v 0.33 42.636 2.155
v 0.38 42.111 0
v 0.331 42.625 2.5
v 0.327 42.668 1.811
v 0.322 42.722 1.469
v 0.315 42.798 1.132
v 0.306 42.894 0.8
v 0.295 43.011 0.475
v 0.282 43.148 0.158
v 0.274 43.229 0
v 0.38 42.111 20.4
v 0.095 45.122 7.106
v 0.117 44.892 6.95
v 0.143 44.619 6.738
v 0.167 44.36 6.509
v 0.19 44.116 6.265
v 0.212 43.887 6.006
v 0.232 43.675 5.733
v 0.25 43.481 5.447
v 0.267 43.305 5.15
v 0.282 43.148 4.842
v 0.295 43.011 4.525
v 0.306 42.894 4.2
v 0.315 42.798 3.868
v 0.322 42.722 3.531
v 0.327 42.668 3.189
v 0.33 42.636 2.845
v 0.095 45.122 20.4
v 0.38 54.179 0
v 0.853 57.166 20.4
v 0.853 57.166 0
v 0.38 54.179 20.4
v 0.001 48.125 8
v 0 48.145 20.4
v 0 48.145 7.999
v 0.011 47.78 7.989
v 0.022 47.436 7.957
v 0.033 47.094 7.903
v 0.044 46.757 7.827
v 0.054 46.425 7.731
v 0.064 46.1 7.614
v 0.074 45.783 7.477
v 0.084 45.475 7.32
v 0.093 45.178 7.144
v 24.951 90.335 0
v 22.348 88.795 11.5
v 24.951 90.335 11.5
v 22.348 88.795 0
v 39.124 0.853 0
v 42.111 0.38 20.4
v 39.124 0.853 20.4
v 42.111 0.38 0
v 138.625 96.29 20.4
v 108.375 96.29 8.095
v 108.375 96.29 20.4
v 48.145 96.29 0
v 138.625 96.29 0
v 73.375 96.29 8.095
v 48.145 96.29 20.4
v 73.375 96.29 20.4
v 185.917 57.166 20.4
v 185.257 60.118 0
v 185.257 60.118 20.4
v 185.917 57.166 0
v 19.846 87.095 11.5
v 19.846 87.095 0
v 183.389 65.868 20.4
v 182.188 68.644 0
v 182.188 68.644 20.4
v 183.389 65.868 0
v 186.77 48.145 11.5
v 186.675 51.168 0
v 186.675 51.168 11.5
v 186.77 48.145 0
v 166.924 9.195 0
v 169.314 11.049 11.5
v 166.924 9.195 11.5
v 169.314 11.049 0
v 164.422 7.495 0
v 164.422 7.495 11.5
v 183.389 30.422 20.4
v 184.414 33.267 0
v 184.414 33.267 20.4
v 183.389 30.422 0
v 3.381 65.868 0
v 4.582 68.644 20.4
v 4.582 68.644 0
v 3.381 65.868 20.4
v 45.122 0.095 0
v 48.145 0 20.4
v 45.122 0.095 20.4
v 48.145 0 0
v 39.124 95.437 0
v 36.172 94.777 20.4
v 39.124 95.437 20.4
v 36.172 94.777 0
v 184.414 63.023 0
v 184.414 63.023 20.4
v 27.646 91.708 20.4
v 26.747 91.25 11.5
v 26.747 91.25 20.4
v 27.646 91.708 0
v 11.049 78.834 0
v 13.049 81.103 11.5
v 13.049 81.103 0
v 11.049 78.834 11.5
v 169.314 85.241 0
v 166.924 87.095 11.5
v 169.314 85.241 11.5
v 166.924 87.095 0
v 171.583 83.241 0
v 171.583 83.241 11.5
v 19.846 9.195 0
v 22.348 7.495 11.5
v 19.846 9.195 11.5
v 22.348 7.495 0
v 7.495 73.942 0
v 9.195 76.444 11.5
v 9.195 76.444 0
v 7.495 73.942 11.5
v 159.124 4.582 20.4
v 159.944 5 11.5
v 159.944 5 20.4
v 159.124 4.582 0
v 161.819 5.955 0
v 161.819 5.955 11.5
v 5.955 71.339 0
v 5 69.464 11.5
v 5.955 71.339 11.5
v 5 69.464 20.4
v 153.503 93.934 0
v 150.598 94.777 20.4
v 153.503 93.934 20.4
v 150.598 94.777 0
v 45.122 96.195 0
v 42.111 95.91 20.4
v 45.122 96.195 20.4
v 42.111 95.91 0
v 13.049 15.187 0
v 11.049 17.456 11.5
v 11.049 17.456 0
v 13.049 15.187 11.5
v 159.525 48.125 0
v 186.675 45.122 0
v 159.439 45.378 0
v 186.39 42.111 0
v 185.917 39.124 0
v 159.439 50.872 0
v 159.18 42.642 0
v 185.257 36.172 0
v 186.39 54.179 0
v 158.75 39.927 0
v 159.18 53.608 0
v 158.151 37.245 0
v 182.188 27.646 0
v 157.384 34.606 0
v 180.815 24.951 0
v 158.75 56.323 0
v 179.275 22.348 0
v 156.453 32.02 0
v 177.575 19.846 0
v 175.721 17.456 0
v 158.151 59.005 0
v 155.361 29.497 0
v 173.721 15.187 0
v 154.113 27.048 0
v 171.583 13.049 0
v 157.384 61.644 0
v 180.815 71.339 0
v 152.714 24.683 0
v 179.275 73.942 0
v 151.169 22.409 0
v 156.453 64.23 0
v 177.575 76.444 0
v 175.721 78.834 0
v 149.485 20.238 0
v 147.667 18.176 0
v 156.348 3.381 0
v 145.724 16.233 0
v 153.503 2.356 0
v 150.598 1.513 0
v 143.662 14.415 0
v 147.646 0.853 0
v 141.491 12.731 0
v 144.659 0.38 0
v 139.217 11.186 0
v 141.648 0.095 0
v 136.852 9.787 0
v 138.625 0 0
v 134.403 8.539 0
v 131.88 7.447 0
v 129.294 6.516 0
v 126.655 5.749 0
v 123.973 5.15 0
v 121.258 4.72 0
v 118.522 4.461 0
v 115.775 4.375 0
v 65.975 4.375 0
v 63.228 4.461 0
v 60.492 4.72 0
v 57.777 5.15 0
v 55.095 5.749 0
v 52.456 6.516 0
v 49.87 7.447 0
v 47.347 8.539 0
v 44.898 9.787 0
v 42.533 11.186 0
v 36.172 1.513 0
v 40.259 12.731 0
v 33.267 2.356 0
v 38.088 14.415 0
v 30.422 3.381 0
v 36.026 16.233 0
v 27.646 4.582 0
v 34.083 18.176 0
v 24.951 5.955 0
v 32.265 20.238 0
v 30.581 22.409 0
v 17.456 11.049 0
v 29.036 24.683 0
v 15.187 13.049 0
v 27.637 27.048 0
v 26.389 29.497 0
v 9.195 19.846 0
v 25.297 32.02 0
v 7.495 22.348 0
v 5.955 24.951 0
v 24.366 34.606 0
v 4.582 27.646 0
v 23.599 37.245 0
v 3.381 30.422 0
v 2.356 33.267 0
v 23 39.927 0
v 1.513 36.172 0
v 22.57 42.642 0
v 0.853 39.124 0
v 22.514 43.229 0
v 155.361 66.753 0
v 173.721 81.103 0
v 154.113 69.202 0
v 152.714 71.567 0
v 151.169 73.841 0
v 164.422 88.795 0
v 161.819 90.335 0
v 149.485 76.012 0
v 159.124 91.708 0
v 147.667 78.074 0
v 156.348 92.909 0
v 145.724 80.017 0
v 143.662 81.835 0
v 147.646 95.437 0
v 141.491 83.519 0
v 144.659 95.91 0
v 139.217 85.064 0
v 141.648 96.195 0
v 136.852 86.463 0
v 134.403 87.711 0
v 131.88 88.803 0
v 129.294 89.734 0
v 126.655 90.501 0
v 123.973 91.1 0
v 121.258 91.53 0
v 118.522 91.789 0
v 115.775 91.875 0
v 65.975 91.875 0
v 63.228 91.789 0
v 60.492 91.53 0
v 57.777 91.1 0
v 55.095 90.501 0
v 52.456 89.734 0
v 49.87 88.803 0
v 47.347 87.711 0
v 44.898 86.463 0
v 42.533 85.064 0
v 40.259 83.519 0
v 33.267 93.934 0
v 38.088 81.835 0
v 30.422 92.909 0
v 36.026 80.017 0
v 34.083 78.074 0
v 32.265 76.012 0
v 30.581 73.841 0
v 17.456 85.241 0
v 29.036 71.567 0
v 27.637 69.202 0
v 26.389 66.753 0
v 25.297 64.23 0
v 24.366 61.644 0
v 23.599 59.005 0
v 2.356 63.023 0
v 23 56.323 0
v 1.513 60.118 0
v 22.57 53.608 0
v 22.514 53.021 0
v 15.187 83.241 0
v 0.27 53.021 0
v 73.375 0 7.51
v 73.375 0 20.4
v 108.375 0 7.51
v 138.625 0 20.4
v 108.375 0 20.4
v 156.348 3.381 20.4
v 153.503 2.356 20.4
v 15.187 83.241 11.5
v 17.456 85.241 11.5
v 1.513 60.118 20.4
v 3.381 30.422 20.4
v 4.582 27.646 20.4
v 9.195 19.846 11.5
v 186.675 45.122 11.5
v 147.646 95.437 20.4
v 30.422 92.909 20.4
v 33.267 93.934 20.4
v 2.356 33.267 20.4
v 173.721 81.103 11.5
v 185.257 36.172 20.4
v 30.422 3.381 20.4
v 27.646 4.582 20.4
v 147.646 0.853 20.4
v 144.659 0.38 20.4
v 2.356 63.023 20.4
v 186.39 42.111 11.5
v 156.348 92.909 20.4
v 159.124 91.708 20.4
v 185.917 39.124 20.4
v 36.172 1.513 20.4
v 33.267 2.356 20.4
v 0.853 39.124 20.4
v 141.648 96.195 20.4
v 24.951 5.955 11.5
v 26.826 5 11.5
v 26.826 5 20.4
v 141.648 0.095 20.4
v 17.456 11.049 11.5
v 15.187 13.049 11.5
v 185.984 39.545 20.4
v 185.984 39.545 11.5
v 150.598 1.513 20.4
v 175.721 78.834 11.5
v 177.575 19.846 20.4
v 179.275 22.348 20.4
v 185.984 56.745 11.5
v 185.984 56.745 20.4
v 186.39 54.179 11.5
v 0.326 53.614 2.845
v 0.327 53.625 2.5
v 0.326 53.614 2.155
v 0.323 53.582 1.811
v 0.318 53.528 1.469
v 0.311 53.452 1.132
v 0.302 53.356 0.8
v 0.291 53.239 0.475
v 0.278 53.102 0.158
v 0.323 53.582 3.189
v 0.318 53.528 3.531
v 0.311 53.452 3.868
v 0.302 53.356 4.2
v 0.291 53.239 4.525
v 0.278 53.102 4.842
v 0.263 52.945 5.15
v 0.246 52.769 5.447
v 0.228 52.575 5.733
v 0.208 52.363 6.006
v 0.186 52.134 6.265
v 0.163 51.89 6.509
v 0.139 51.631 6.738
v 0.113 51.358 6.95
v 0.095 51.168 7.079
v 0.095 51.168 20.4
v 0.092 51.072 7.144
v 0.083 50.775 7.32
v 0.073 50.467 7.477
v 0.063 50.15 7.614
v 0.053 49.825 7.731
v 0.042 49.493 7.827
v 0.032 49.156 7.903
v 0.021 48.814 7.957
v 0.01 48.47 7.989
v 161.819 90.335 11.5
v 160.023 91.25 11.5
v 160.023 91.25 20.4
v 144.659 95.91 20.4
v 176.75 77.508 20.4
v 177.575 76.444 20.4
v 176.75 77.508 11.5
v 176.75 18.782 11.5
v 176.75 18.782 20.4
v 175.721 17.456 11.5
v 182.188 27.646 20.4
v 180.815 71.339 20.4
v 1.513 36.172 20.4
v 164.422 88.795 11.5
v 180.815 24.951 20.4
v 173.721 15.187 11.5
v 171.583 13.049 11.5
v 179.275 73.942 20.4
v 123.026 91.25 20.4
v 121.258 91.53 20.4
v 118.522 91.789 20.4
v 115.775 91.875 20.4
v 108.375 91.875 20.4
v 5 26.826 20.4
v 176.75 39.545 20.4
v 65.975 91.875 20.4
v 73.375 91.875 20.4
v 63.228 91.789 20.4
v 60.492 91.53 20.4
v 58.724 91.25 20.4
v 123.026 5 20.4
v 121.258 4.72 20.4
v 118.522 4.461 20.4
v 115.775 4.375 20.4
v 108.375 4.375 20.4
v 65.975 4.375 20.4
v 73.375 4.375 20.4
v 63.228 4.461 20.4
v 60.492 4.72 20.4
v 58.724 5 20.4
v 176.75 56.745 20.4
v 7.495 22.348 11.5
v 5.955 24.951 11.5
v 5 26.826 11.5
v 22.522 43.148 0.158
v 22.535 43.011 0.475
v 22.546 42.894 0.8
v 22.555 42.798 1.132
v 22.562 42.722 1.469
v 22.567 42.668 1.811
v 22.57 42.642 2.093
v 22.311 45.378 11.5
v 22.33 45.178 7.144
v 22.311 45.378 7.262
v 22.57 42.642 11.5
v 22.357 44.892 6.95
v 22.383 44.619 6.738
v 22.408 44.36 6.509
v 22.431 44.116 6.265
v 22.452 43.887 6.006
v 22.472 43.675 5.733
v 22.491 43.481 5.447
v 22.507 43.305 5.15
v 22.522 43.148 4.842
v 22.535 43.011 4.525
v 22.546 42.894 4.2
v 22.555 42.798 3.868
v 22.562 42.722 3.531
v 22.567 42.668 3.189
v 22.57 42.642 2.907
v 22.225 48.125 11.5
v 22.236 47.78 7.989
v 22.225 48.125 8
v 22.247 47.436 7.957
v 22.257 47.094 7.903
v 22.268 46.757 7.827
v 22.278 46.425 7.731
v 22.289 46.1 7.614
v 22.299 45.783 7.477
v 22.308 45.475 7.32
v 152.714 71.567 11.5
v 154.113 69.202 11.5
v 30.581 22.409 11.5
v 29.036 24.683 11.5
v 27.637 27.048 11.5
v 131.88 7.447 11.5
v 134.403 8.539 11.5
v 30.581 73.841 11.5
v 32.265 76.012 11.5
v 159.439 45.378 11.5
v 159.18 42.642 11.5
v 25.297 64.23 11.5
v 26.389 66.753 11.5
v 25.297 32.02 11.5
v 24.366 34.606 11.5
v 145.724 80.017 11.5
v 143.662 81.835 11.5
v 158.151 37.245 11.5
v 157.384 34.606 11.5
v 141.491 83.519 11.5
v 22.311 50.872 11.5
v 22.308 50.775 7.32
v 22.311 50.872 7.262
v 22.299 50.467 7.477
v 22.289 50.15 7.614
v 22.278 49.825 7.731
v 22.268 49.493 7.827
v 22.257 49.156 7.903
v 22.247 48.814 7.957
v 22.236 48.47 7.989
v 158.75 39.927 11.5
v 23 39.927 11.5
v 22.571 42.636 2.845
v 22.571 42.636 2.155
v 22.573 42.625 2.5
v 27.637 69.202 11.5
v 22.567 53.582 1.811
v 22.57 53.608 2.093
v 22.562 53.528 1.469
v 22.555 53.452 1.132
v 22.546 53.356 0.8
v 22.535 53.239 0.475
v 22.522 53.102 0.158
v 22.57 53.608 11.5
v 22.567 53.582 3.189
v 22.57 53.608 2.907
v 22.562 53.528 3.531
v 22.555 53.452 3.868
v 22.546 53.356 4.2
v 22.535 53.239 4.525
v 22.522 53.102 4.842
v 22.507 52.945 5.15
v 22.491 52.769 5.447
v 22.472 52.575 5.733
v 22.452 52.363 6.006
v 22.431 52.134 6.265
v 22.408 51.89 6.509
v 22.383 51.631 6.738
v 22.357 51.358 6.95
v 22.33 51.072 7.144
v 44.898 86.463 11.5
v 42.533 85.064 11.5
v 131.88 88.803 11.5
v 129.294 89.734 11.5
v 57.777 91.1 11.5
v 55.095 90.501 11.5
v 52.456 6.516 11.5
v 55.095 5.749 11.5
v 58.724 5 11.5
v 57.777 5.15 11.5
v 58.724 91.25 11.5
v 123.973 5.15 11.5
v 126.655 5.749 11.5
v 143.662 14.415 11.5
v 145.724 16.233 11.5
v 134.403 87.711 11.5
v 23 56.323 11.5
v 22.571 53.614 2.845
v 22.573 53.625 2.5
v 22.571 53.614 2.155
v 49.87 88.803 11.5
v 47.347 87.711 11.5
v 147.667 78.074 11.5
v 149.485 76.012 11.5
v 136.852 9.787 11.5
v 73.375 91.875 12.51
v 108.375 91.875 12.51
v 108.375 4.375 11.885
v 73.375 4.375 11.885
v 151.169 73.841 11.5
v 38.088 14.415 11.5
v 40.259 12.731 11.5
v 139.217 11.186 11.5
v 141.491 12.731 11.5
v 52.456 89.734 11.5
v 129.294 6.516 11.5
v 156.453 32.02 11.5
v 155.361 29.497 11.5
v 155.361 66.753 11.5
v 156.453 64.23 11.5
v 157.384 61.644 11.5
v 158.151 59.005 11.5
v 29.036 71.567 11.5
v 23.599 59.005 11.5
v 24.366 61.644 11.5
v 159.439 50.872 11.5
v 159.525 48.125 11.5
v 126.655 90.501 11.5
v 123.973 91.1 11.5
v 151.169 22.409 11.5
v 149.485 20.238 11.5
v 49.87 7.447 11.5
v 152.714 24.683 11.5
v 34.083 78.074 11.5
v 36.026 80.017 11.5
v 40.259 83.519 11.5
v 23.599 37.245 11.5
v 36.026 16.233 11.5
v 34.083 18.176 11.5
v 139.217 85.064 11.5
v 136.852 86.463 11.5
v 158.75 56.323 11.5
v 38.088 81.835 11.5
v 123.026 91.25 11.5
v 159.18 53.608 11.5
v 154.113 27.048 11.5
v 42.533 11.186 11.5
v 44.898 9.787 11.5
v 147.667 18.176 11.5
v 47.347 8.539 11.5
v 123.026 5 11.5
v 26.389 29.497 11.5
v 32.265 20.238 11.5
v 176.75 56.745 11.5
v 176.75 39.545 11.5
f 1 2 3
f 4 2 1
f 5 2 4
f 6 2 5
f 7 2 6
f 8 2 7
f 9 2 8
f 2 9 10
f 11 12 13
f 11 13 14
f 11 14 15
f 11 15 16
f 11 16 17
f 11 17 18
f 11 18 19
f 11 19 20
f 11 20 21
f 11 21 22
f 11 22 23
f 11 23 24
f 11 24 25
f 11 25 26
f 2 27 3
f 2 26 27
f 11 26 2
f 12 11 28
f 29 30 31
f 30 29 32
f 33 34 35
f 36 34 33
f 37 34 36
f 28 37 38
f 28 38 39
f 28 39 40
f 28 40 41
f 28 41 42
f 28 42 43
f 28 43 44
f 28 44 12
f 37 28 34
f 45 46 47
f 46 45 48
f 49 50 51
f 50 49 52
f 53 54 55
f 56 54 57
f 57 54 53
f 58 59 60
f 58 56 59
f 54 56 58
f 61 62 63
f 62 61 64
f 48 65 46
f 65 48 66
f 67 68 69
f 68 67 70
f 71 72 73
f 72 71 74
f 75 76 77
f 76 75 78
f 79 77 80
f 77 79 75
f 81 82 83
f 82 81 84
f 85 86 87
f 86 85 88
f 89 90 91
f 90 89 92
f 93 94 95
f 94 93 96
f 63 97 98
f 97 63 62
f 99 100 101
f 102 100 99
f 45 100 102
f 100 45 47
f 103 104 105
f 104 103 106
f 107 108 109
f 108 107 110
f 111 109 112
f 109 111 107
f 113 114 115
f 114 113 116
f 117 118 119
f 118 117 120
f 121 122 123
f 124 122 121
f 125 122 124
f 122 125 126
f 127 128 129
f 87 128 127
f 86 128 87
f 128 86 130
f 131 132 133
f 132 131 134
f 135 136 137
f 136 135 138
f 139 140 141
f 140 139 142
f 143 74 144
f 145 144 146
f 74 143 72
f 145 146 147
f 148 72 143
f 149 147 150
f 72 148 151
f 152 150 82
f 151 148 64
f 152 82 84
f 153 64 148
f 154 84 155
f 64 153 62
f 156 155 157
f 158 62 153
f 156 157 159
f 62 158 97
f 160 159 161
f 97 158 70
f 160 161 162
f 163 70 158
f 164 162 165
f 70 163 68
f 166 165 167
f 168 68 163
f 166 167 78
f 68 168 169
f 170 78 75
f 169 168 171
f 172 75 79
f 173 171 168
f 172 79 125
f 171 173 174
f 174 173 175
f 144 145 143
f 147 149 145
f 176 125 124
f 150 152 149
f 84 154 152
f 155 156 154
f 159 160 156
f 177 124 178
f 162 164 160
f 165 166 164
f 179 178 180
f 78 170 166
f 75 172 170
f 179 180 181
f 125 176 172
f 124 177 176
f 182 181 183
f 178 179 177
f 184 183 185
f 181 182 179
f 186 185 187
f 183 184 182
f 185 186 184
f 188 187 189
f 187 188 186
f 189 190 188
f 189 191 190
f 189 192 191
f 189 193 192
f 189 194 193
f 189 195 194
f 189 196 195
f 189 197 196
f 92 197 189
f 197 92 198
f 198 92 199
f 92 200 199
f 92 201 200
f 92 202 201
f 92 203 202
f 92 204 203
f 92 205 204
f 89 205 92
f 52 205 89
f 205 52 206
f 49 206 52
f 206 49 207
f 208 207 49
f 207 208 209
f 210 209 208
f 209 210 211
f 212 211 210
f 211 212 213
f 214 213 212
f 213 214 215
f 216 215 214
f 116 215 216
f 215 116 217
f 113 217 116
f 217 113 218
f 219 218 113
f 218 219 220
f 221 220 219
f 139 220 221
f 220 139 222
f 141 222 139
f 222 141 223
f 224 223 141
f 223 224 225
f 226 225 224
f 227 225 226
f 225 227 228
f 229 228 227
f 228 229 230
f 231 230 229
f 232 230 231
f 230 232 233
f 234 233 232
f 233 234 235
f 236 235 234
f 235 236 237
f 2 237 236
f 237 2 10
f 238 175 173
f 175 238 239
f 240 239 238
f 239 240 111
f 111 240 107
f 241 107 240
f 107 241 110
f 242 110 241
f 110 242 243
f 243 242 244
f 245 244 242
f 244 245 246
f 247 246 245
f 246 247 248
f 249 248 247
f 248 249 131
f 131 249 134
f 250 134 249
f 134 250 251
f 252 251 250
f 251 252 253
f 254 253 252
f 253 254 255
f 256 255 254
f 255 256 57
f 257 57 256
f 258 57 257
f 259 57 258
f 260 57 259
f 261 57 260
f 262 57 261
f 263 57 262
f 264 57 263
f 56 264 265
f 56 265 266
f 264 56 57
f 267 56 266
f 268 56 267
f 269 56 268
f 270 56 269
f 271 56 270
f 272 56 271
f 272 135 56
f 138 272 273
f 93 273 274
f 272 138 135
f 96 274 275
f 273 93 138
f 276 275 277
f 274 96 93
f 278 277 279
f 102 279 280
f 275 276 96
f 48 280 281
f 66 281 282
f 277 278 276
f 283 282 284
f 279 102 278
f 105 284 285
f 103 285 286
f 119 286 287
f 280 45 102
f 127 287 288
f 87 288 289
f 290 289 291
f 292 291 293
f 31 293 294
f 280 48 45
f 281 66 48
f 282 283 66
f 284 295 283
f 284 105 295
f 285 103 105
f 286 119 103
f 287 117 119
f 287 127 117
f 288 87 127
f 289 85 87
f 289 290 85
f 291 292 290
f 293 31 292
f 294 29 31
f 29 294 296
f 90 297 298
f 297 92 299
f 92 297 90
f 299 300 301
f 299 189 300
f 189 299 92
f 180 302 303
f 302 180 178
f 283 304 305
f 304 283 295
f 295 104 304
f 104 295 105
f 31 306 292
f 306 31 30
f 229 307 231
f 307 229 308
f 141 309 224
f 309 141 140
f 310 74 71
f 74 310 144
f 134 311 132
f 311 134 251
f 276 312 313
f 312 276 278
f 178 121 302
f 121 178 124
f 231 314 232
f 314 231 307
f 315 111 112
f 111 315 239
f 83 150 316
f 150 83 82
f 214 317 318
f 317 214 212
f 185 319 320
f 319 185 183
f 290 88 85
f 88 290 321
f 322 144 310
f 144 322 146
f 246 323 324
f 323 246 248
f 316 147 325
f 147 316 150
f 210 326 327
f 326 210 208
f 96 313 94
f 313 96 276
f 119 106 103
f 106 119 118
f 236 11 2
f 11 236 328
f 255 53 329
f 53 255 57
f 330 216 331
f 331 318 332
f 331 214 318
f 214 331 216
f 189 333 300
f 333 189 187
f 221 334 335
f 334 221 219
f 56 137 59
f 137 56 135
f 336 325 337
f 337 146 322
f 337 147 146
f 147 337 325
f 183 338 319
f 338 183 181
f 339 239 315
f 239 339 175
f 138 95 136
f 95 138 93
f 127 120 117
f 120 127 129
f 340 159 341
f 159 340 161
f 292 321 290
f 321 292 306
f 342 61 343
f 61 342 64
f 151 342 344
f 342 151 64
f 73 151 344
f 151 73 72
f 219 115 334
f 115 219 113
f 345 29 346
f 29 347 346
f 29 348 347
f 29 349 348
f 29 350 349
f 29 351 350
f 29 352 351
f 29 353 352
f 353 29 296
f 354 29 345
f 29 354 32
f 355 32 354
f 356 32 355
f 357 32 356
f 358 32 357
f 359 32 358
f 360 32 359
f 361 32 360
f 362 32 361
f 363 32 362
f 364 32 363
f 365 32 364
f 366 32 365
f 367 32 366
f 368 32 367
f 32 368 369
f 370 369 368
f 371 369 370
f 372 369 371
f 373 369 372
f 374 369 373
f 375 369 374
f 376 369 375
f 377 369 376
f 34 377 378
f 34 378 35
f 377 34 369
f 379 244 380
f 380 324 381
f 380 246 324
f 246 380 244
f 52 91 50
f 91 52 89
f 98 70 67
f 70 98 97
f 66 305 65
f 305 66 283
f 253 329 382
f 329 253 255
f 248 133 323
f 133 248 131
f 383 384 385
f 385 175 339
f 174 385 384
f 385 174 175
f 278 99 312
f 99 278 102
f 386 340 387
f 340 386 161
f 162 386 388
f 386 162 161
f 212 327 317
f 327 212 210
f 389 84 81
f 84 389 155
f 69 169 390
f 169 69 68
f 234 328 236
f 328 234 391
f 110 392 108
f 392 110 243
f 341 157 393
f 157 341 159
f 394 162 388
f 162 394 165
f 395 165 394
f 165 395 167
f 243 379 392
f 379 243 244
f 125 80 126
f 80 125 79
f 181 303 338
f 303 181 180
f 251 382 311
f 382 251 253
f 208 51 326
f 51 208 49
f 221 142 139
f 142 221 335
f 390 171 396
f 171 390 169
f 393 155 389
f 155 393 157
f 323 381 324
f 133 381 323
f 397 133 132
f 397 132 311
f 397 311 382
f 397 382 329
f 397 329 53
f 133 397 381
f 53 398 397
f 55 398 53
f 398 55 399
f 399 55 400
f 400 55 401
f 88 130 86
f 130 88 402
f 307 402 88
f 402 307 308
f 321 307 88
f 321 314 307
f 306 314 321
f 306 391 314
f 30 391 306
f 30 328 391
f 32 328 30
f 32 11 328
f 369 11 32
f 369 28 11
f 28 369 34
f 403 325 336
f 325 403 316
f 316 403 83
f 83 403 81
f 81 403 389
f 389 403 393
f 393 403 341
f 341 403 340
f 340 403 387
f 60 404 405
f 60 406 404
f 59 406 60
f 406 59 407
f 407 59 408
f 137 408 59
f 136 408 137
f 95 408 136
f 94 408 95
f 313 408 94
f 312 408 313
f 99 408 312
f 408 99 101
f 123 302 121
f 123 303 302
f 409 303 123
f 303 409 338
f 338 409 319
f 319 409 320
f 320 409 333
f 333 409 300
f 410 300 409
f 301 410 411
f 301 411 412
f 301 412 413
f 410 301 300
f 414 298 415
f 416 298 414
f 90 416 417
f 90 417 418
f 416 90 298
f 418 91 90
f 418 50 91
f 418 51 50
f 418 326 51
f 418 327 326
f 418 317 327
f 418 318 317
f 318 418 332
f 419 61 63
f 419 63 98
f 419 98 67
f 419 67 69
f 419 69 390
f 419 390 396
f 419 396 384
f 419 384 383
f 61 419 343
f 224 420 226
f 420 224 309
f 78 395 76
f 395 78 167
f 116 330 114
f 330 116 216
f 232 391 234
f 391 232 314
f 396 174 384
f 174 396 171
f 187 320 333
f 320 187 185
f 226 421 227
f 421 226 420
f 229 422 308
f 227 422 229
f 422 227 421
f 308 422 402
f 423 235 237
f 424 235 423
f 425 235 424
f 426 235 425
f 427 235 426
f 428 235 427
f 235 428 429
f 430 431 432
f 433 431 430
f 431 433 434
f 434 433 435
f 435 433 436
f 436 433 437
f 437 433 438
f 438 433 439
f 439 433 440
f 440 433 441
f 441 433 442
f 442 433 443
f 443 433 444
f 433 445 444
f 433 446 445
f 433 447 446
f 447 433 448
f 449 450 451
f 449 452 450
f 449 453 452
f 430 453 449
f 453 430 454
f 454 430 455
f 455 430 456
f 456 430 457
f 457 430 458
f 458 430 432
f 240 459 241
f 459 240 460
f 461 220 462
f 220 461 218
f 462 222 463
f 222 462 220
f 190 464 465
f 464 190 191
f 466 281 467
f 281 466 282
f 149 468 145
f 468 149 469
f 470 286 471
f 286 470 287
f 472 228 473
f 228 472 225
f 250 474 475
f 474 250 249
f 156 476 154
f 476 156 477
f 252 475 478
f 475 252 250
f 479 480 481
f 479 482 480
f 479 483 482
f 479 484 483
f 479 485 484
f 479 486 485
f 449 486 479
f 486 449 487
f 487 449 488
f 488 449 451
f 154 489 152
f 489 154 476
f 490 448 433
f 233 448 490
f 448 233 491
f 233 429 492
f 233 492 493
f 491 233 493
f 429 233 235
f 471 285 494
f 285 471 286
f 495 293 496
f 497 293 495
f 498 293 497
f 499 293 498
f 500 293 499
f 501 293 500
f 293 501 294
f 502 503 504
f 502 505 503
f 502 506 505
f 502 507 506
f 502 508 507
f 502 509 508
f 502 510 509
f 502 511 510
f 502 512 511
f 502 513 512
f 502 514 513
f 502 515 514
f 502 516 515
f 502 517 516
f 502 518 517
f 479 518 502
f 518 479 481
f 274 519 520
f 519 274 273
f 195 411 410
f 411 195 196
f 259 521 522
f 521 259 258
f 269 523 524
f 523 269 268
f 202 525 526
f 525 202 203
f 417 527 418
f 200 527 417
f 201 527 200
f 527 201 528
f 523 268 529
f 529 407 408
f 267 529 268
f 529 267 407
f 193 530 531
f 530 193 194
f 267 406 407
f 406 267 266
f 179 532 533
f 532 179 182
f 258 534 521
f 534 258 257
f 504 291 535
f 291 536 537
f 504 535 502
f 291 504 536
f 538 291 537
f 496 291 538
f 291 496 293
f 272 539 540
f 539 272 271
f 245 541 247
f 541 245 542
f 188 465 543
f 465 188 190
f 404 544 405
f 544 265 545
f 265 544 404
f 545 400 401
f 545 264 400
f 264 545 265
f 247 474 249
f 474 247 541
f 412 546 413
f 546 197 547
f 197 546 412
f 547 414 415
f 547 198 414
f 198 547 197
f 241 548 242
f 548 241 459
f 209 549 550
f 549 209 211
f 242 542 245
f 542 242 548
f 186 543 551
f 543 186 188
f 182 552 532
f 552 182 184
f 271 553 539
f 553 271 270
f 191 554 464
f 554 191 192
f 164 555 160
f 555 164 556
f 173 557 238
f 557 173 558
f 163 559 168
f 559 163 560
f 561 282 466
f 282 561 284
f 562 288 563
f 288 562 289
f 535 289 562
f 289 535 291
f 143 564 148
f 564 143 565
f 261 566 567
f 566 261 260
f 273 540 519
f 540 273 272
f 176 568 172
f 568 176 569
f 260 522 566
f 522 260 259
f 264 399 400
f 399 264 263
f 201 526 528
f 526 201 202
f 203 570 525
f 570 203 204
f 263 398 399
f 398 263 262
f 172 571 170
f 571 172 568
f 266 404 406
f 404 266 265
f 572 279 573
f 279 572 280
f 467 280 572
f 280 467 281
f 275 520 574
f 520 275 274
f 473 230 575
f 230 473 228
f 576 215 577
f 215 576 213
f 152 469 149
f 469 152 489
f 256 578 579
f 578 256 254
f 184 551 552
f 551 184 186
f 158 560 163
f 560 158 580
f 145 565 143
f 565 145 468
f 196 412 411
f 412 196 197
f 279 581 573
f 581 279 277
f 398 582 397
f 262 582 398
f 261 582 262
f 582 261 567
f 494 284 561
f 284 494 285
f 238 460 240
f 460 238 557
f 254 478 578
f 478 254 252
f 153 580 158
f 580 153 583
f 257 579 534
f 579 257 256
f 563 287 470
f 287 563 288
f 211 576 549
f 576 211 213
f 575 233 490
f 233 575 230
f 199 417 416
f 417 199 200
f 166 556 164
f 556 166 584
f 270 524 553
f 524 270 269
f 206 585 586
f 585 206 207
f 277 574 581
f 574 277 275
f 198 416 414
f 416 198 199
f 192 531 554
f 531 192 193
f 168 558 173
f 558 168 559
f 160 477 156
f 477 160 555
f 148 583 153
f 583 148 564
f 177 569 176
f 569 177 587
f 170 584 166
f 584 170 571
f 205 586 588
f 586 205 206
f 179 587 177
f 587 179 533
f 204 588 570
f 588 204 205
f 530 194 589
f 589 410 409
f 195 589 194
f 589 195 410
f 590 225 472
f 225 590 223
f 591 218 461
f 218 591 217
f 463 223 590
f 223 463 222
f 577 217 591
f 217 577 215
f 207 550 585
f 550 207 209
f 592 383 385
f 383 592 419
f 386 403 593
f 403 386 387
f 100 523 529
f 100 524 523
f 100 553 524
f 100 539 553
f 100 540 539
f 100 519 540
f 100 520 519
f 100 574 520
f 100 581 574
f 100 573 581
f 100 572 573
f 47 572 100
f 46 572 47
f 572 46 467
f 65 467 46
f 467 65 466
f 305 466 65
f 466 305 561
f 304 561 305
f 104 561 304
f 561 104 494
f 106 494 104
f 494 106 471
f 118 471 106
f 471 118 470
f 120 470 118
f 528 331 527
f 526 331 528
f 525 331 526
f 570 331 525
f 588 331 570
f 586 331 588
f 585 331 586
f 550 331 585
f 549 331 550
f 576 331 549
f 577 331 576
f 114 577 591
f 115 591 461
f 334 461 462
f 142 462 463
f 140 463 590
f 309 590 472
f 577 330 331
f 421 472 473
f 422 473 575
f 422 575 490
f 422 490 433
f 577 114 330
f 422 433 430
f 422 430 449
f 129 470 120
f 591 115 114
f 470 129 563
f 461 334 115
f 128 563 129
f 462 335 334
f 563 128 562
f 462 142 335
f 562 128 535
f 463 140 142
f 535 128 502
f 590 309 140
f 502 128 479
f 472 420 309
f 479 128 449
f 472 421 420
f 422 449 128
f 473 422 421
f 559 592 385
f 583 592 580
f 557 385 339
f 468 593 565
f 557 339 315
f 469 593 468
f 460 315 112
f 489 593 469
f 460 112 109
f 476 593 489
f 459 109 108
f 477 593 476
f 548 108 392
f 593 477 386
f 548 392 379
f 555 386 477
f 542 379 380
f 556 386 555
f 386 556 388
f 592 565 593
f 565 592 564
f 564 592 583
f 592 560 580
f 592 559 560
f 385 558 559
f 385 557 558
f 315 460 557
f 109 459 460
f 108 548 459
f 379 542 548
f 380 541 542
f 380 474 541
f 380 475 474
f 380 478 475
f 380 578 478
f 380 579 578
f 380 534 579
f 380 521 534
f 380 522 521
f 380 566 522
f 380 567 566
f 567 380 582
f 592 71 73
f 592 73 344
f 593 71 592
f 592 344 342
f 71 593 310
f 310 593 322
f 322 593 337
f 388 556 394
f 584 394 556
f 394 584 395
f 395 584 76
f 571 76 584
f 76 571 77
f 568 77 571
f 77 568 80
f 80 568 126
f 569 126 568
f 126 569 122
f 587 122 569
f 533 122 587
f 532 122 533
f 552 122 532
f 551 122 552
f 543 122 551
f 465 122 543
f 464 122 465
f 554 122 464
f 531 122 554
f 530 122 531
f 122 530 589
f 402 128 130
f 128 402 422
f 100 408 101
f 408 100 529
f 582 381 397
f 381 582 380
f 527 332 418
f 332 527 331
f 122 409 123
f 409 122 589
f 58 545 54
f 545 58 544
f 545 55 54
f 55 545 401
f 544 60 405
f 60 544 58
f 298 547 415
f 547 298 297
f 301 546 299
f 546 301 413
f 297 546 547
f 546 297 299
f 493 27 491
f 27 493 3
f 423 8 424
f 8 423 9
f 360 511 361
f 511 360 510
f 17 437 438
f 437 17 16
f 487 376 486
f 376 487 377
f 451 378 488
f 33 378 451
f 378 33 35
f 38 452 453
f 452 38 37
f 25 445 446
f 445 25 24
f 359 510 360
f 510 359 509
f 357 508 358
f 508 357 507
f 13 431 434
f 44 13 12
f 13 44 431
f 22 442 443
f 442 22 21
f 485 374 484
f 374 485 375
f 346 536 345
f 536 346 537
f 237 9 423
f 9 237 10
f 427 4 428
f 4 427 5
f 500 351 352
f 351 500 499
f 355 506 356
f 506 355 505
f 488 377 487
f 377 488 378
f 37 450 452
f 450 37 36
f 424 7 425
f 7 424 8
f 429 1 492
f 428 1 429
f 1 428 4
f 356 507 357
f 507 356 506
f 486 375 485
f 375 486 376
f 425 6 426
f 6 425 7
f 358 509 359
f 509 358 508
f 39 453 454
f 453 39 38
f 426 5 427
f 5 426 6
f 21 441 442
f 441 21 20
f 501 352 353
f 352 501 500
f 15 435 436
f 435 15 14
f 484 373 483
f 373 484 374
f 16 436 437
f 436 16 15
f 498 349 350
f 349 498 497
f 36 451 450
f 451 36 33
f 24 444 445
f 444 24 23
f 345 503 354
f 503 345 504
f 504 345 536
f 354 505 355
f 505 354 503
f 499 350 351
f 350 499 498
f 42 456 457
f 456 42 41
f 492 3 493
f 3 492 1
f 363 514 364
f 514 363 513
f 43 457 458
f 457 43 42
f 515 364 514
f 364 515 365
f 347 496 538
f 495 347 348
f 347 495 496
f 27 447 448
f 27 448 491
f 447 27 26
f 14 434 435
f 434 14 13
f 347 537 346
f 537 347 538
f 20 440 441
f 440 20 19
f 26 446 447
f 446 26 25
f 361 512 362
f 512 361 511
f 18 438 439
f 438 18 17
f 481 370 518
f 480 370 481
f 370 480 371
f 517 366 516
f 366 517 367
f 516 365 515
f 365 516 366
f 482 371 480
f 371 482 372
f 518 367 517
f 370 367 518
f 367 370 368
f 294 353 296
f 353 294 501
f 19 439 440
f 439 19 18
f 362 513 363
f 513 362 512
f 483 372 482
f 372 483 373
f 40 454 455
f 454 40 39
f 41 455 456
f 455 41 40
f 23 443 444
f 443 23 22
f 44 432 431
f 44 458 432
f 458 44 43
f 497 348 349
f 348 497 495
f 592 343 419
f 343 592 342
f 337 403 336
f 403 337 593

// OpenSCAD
$fn = 100;

// Charger measurements
cRadius = 43.75;       //charger circle radius
cThickness = 11.5;     //charger thickness
cCenterXDist = 49.8;   //distence between charger circle centers

// Phone measurements
pThickness = 13.35;    //phone thickness
pLength = 171.75;      //phone length
pWidth = 86.25;        //phone width

// Alignment values for charger translation
cLength = cRadius * 2 + cCenterXDist;
cWidth = cRadius * 2;
xAlign = cRadius + (pLength-cLength) / 2 + 5;
yAlign = cRadius + (pWidth+10-cWidth) / 2;

// Holder measurements
hThickness = cThickness+pThickness;
hRadius = pWidth/2 + 5.02;
hLength = pLength - hRadius*2 + 15.02;

// Monitor cord measurements
mcThickness = pThickness*(201/300);
mcWidth = 17.2;
mcLength = 10.1;

module Charger(xt, yt, zt){
  translate([xt, yt, zt]) 
    color("black") 
    linear_extrude(height = hThickness) {
      hull() {
        circle(cRadius);
        translate([cCenterXDist, 0, 0])
          circle(cRadius);
      }
    }
}

module Phone(xt, yt, zt){
  translate([xt, yt, zt])
    color("blue")
    cube([pLength, pWidth, pThickness]);
}

module Holder(xt, yt, zt){
  color("green")
    linear_extrude(hThickness-(pThickness/3))
      translate([hRadius, hRadius, 0])
      hull(){
        circle(hRadius);
        translate([hLength, 0, 0])
          circle(hRadius);
      }
}

module Slopes(xt, yt, zt, rot){
  translate([xt, yt, zt])
    rotate([90, 0, rot])
    linear_extrude(35)
    polygon([[0,0],
             [5.02,5.02],
             [5.02,pThickness + 0.02],
             [0,pThickness + 0.02]]);
}


module SlopeTop(xt, yt, zt){
  color("red")
    translate([xt, yt, zt])
    Slopes(35, 5.01, 0, -90);
}

module SlopeBottom(xt, yt, zt){
  translate([xt, yt, zt])
  Slopes(0, -0.01, 0, 90);
}

module PowerCordSlot(xt, yt, zt){
  translate([xt, yt, zt])
    rotate([0, 90, 0])
    cylinder(h=30, r=5.5, center=false);
}

module MonitorCordSlot(xt, yt, zt){
  translate([xt, yt, zt])
    cube([mcLength, mcWidth, mcThickness], center=false);
}


difference() {
  Holder(0, 0, 0);
  Charger(xAlign, yAlign, -0.01);
  Phone(5, 5, cThickness);
  SlopeTop(xAlign + cCenterXDist/2 - 17.5,
           yAlign + cRadius,
           cThickness - 4);
  SlopeBottom(xAlign + cCenterXDist/2 - 17.5,
              0,
              cThickness - 4);
  PowerCordSlot(-0.01, (pWidth+10)/2, 2.5);
  MonitorCordSlot(pLength+4.99,hRadius-(mcWidth/2),cThickness); 
}
